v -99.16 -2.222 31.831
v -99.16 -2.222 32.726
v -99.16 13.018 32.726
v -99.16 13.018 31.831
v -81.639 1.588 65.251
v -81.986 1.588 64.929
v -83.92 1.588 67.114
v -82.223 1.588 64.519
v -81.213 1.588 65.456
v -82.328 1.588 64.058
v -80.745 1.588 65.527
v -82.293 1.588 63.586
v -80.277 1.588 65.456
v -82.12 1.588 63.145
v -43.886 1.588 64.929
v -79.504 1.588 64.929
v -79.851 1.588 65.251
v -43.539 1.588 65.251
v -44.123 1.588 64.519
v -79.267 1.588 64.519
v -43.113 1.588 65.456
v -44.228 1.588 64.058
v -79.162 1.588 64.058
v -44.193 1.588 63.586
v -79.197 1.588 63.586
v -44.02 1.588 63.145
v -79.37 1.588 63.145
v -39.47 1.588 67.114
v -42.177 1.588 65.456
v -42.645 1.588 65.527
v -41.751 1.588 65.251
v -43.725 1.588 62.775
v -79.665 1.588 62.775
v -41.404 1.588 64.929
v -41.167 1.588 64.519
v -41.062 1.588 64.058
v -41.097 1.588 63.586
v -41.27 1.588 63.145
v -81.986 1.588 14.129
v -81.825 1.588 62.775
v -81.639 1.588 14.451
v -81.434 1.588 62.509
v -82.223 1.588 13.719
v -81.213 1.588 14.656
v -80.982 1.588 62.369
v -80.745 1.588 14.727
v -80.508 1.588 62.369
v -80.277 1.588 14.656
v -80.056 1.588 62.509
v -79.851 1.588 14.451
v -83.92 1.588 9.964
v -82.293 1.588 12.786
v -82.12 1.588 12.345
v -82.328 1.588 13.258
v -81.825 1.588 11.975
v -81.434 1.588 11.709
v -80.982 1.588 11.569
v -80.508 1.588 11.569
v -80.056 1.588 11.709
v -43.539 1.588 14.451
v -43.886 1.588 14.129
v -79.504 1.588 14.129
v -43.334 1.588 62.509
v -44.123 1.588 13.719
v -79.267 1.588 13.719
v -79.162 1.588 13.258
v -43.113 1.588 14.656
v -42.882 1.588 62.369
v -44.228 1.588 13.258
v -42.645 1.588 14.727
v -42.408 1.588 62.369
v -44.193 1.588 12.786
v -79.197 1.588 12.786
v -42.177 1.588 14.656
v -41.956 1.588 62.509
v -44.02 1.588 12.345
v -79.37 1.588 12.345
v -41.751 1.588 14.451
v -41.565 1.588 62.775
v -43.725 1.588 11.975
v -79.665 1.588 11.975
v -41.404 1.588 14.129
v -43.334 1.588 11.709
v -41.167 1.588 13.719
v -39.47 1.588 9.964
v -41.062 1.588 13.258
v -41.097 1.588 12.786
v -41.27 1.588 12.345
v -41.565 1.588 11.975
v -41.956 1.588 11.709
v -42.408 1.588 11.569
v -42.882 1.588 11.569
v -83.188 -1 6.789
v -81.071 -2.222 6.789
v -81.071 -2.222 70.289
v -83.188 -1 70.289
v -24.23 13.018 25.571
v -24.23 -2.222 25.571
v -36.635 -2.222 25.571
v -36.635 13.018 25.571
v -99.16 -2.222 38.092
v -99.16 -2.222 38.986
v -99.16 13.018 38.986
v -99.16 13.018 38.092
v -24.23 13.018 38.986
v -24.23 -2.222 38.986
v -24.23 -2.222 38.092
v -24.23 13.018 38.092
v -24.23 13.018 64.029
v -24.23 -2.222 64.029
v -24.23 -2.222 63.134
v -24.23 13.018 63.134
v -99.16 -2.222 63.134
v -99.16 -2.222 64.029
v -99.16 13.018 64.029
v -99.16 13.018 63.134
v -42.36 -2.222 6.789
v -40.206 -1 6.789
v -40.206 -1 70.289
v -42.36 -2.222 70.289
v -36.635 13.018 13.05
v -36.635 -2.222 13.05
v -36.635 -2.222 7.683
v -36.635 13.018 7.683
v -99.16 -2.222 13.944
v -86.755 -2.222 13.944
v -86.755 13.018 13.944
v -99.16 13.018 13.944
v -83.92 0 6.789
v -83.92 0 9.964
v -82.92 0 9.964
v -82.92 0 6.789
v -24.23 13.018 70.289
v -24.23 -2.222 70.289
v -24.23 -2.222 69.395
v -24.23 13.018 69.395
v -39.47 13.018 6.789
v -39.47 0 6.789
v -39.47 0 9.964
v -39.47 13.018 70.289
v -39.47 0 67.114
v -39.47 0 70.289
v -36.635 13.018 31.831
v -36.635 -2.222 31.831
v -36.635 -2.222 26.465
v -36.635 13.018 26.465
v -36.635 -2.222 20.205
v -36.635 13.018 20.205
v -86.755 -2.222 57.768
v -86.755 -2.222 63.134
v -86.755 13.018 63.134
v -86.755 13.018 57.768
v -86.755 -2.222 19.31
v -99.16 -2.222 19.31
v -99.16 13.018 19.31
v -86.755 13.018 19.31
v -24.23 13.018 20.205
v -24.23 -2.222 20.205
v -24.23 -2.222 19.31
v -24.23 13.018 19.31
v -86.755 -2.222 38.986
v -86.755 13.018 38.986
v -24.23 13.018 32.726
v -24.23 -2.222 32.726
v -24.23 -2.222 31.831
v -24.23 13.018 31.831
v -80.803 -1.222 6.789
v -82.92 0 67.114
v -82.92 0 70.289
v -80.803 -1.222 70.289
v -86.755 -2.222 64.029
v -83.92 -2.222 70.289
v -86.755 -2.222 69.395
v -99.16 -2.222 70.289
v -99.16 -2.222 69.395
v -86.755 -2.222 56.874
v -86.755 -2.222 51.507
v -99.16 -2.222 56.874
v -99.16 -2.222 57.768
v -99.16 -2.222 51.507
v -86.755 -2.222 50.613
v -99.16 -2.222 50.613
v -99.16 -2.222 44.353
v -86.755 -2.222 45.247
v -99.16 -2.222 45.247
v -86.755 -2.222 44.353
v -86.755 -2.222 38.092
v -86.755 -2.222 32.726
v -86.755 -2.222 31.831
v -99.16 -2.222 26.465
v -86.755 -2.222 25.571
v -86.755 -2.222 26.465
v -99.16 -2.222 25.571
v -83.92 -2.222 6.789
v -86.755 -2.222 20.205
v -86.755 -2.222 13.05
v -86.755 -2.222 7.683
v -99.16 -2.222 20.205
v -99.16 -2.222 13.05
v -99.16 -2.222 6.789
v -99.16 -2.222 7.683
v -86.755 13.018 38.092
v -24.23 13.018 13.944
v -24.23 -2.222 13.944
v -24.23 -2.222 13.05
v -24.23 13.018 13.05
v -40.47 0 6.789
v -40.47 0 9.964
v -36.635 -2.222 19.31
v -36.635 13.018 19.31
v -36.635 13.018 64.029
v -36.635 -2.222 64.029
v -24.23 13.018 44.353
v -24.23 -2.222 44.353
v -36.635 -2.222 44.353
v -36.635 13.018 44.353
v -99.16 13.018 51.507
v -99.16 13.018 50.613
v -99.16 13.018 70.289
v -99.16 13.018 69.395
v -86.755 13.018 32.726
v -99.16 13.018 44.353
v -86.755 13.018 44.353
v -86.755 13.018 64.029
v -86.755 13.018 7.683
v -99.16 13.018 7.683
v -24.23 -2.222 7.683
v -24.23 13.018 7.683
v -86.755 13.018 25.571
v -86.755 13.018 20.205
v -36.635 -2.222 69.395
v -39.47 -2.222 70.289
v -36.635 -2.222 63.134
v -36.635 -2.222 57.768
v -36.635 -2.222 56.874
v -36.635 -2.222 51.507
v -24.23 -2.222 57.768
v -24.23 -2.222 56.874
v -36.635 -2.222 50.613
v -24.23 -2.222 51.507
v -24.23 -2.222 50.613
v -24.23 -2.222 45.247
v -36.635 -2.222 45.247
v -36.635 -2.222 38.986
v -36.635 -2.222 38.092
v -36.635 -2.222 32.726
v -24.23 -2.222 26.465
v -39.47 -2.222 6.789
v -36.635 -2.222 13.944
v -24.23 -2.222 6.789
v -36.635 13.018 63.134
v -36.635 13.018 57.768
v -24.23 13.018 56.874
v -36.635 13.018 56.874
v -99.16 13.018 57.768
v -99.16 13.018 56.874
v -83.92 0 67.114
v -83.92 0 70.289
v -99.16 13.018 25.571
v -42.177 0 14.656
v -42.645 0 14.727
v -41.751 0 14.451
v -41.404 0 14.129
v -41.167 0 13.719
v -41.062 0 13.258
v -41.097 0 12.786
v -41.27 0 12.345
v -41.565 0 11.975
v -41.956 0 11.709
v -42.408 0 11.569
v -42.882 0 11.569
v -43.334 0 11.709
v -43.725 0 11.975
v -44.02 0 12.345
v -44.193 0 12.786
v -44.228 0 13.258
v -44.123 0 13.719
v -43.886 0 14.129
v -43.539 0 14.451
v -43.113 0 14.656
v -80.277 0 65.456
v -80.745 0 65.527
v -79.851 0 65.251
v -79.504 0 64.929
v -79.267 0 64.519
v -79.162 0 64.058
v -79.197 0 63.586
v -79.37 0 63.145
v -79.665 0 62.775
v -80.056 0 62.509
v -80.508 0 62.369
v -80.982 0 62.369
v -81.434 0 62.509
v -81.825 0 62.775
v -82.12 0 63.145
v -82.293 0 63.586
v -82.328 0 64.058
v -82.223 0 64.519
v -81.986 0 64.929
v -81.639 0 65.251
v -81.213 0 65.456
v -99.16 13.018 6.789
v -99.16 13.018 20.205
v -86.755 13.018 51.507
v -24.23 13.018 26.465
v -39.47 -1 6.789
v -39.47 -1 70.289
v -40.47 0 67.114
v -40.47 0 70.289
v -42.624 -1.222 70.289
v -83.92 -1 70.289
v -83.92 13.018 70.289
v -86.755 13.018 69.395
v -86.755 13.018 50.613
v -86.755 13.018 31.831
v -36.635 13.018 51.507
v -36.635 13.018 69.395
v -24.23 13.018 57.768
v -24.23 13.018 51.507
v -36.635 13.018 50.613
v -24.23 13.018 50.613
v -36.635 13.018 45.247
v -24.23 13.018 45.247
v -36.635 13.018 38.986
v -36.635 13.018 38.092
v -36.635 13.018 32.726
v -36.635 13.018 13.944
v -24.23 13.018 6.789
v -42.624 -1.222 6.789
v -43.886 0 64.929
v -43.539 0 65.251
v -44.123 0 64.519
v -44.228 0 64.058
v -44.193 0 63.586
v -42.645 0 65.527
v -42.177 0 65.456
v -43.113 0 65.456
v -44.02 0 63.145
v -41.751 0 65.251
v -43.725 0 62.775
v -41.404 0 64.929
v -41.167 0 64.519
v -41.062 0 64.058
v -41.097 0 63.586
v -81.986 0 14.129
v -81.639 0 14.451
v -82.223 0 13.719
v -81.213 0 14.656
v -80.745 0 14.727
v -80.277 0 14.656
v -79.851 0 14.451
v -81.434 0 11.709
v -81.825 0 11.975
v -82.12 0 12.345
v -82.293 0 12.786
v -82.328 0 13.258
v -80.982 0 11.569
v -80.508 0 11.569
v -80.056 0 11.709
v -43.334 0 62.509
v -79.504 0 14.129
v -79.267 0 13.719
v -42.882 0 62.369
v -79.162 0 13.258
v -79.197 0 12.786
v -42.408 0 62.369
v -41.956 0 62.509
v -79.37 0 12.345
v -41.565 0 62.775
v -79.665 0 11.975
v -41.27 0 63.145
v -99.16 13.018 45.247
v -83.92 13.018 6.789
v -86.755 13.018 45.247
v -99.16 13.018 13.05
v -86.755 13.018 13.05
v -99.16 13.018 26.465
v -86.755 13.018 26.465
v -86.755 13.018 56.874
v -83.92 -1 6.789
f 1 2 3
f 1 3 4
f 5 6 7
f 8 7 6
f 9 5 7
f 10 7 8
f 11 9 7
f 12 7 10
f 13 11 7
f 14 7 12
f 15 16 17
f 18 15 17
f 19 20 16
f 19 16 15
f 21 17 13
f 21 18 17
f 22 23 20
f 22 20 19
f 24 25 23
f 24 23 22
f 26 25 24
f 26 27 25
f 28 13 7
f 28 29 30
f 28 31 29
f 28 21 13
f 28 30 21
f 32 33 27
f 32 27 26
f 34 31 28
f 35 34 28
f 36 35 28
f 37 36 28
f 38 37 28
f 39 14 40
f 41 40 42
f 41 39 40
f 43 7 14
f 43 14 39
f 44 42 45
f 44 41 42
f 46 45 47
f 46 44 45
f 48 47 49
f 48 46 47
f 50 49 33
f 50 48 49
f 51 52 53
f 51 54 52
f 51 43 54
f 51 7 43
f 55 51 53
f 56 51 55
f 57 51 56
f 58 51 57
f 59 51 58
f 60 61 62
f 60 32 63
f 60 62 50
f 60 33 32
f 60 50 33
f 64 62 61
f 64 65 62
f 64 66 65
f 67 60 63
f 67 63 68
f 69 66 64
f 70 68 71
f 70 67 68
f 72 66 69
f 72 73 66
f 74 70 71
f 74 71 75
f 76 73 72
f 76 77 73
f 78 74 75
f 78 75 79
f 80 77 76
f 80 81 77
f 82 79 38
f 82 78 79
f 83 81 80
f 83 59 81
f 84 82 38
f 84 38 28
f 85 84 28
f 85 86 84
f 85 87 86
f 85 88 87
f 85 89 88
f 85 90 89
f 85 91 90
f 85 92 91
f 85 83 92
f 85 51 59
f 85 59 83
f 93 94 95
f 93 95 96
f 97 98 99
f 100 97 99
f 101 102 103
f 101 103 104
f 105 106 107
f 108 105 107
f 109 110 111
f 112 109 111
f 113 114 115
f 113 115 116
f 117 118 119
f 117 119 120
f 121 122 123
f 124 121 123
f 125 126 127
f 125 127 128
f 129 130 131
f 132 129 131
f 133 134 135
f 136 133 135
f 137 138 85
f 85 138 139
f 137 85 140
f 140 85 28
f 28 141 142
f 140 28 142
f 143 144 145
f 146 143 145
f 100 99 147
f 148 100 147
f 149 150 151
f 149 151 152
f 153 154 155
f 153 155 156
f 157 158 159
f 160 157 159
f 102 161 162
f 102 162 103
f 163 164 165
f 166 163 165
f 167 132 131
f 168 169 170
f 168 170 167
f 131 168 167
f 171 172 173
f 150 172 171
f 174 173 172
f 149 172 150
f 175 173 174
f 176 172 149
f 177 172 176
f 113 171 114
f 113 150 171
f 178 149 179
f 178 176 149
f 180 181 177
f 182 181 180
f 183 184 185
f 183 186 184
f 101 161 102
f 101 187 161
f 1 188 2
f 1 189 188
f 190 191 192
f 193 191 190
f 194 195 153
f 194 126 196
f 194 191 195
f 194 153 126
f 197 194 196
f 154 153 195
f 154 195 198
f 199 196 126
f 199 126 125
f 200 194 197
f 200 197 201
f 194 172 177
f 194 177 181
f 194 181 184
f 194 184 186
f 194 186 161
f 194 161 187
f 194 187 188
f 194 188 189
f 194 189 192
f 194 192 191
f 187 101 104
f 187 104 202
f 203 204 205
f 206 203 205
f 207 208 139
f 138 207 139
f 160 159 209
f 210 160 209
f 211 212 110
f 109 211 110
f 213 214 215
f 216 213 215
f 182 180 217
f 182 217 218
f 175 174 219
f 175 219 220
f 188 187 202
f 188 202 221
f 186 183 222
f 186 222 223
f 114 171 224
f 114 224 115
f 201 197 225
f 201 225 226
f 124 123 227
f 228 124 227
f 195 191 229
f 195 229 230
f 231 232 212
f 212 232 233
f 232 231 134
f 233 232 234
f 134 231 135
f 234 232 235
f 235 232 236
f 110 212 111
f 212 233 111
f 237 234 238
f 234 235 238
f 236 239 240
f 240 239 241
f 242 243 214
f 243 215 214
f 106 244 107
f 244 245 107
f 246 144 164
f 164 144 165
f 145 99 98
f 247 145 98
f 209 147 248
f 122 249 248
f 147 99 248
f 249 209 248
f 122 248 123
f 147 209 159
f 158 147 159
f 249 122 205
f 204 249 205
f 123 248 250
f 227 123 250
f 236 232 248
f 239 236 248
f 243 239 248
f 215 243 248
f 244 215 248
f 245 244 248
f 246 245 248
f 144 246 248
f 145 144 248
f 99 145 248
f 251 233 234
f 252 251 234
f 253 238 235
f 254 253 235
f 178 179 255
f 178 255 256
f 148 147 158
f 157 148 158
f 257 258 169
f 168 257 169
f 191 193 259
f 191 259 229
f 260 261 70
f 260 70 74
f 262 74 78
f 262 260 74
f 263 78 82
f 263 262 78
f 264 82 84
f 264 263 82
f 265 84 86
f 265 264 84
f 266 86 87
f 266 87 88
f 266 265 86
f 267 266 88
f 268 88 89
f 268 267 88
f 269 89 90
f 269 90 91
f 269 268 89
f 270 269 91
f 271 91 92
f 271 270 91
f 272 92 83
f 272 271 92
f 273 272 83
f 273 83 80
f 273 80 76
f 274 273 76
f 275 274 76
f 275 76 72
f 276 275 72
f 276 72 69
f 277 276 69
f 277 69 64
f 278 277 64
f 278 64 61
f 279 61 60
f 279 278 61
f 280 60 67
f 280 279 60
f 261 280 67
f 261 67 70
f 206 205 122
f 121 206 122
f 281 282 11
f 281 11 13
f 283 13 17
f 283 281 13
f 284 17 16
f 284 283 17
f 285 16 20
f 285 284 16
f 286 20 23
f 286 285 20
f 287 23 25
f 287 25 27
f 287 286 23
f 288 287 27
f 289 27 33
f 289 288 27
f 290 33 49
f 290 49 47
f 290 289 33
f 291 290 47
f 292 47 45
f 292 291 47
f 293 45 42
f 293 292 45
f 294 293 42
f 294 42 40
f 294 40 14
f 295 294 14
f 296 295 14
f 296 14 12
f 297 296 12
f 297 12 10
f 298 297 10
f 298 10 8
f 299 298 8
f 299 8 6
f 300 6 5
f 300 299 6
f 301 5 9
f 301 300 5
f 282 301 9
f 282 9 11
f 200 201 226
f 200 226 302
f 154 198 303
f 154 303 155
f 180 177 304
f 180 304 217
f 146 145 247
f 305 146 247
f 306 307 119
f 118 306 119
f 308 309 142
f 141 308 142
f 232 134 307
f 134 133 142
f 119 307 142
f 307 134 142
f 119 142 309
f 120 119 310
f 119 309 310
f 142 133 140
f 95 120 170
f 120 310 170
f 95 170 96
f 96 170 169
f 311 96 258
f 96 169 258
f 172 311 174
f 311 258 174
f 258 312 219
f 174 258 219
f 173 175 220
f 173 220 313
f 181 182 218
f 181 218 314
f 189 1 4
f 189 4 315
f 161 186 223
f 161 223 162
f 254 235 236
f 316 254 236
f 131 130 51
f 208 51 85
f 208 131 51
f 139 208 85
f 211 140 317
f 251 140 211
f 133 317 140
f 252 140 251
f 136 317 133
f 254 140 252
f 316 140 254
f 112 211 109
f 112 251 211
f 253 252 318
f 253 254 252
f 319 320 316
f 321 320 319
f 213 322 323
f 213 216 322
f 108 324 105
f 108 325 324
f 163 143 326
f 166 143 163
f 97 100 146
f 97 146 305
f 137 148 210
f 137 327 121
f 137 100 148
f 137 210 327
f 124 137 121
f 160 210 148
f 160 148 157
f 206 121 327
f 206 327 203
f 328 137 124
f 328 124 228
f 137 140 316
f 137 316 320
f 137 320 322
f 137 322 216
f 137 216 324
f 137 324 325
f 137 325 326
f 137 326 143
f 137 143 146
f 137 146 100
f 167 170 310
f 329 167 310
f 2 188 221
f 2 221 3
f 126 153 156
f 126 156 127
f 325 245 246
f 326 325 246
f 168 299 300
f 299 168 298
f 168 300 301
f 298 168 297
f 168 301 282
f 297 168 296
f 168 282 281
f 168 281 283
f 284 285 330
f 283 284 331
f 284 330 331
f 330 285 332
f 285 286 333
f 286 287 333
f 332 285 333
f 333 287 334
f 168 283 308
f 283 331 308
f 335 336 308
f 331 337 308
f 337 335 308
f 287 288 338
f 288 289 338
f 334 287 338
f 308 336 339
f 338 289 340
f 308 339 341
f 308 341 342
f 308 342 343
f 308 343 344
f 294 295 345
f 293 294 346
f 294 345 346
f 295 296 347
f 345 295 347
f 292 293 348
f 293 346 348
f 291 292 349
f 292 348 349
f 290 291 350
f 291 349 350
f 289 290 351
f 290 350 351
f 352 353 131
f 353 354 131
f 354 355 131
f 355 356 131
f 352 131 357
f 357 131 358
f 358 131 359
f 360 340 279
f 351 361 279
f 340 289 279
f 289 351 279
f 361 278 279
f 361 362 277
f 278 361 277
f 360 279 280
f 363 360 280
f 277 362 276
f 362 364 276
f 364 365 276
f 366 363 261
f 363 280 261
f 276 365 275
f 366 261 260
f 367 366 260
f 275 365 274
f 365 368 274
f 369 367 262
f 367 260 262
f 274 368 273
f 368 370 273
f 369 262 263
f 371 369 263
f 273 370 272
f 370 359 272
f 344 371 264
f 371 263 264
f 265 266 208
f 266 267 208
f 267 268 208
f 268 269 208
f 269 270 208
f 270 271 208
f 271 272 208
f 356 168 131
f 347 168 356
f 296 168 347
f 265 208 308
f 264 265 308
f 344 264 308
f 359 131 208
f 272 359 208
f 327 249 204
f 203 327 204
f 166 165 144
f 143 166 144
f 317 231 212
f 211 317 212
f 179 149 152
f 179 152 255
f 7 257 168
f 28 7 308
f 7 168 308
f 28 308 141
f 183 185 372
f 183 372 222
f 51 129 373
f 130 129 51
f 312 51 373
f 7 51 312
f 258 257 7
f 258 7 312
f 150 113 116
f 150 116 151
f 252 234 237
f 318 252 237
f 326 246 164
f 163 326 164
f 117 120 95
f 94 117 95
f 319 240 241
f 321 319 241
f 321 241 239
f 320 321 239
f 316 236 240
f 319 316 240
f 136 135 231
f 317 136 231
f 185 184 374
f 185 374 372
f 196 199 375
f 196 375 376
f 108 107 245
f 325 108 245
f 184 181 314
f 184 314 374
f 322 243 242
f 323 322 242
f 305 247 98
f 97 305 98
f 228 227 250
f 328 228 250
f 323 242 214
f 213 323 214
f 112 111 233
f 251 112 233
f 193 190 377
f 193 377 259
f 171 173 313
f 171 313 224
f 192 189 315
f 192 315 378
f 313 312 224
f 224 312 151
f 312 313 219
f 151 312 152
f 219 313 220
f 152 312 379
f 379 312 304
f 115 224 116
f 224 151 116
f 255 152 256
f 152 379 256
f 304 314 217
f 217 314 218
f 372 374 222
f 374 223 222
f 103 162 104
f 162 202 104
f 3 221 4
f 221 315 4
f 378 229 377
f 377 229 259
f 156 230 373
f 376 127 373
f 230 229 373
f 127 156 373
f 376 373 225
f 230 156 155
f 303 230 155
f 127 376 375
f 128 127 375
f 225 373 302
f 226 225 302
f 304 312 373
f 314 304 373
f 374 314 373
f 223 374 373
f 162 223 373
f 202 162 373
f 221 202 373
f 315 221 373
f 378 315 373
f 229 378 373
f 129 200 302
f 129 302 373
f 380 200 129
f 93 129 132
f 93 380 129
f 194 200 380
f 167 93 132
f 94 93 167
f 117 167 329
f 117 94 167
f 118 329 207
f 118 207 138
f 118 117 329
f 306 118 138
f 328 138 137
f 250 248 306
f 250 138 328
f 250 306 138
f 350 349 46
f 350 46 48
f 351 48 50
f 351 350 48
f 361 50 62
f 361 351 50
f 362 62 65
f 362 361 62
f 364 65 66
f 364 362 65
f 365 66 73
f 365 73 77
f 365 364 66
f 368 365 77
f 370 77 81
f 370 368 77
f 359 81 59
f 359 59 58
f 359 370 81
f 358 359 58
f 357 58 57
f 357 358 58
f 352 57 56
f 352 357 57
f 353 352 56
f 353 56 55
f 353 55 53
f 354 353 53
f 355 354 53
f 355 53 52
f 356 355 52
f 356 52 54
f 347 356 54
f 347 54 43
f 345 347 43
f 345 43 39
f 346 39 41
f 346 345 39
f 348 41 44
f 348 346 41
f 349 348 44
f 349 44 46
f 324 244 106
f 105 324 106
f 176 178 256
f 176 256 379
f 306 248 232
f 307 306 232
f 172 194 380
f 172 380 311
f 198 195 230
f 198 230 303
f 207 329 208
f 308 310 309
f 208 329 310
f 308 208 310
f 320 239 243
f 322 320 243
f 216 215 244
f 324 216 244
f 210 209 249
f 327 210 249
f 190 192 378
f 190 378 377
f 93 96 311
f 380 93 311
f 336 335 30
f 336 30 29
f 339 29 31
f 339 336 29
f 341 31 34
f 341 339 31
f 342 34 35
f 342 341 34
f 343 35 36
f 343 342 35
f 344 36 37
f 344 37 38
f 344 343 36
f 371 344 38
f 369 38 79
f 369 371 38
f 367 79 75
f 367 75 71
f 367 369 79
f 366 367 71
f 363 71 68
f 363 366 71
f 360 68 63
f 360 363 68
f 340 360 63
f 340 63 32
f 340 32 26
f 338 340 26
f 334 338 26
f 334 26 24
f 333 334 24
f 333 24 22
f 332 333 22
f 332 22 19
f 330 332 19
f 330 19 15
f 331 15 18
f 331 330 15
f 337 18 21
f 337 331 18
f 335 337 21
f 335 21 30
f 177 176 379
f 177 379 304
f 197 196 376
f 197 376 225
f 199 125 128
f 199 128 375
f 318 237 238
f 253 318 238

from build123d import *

# Parameters (mm, degrees)
SKETCH1_W                = 44.45
SKETCH1_H                = 57.15
SKETCH1_R                = 1.5875
BOSS_EXTRUDE1_DEPTH      = 1.5875
BOSS_EXTRUDE2_DEPTH      = 11.43
BOSS_EXTRUDE2_DEPTH_BACK = 3.81
BOSS_EXTRUDE3_REACH      = 120.467


with BuildPart() as part:
    # Sketch1 → Boss-Extrude1 (new body)
    with BuildSketch(Plane(origin=(0, 0, 0), x_dir=(1, 0, 0), z_dir=(0, 1, 0))):
        with Locations((-61.695053498, -38.539128831)):
            Rectangle(SKETCH1_W, SKETCH1_H)
        with Locations(Location((-80.745053498, -63.939128831, 0), (0, 0, 270))):
            Circle(SKETCH1_R, mode=Mode.SUBTRACT)
        with Locations(Location((-42.645053498, -63.939128831, 0), (0, 0, 270))):
            Circle(SKETCH1_R, mode=Mode.SUBTRACT)
        with Locations(Location((-42.645053498, -13.139128831, 0), (0, 0, 270))):
            Circle(SKETCH1_R, mode=Mode.SUBTRACT)
        with Locations(Location((-80.745053498, -13.139128831, 0), (0, 0, 270))):
            Circle(SKETCH1_R, mode=Mode.SUBTRACT)
    extrude(amount=BOSS_EXTRUDE1_DEPTH)

    # Sketch2 → Boss-Extrude2 (add, two sides: drawn at the far end of the back side and taken through both)
    with BuildSketch(Plane(origin=(0, 1.5875, 0), x_dir=(1, 0, 0), z_dir=(0, 1, 0)).offset(-BOSS_EXTRUDE2_DEPTH_BACK)):
        Polygon((-99.160053498, -6.789128831), (-83.920053498, -6.789128831), (-83.920053498, -70.289128831), (-99.160053498, -70.289128831), (-99.160053498, -69.394762634), (-86.755200336, -69.394762634), (-86.755200336, -64.028565451), (-99.160053498, -64.028565451), (-99.160053498, -63.134199254), (-86.755200336, -63.134199254), (-86.755200336, -57.768002071), (-99.160053498, -57.768002071), (-99.160053498, -56.873635873), (-86.755200336, -56.873635873), (-86.755200336, -51.50743869), (-99.160053498, -51.50743869), (-99.160053498, -50.613072493), (-86.755200336, -50.613072493), (-86.755200336, -45.24687531), (-99.160053498, -45.24687531), (-99.160053498, -44.352509113), (-86.755200336, -44.352509113), (-86.755200336, -38.98631193), (-99.160053498, -38.98631193), (-99.160053498, -38.091945732), (-86.755200336, -38.091945732), (-86.755200336, -32.725748549), (-99.160053498, -32.725748549), (-99.160053498, -31.831382352), (-86.755200336, -31.831382352), (-86.755200336, -26.465185169), (-99.160053498, -26.465185169), (-99.160053498, -25.570818972), (-86.755200336, -25.570818972), (-86.755200336, -20.204621789), (-99.160053498, -20.204621789), (-99.160053498, -19.310255592), (-86.755200336, -19.310255592), (-86.755200336, -13.944058409), (-99.160053498, -13.944058409), (-99.160053498, -13.049692211), (-86.755200336, -13.049692211), (-86.755200336, -7.683495028), (-99.160053498, -7.683495028), align=None)
        Polygon((-24.230053498, -7.683495028), (-24.230053498, -6.789128831), (-39.470053498, -6.789128831), (-39.470053498, -70.289128831), (-24.230053498, -70.289128831), (-24.230053498, -69.394762634), (-36.63490666, -69.394762634), (-36.63490666, -64.028565451), (-24.230053498, -64.028565451), (-24.230053498, -63.134199254), (-36.63490666, -63.134199254), (-36.63490666, -57.768002071), (-24.230053498, -57.768002071), (-24.230053498, -56.873635873), (-36.63490666, -56.873635873), (-36.63490666, -51.50743869), (-24.230053498, -51.50743869), (-24.230053498, -50.613072493), (-36.63490666, -50.613072493), (-36.63490666, -45.24687531), (-24.230053498, -45.24687531), (-24.230053498, -44.352509113), (-36.63490666, -44.352509113), (-36.63490666, -38.98631193), (-24.230053498, -38.98631193), (-24.230053498, -38.091945732), (-36.63490666, -38.091945732), (-36.63490666, -32.725748549), (-24.230053498, -32.725748549), (-24.230053498, -31.831382352), (-36.63490666, -31.831382352), (-36.63490666, -26.465185169), (-24.230053498, -26.465185169), (-24.230053498, -25.570818972), (-36.63490666, -25.570818972), (-36.63490666, -20.204621789), (-24.230053498, -20.204621789), (-24.230053498, -19.310255592), (-36.63490666, -19.310255592), (-36.63490666, -13.944058409), (-24.230053498, -13.944058409), (-24.230053498, -13.049692211), (-36.63490666, -13.049692211), (-36.63490666, -7.683495028), align=None)
    extrude(amount=BOSS_EXTRUDE2_DEPTH + BOSS_EXTRUDE2_DEPTH_BACK)

    # Boss-Extrude3: up to this face of the body (flat: up to its plane)
    boss_extrude3_end = Plane(part.part.faces().sort_by_distance((-91.540053498, 5.3975, 6.789128831))[0])
    # Sketch4 → Boss-Extrude3 (add, up to the picked face)
    with BuildSketch(Plane.XY.offset(70.289128831), mode=Mode.PRIVATE) as boss_extrude3_sk1:
        Polygon((-83.920053498, 0), (-82.920053498, 0), (-80.802621386, -1.2225), (-42.623870056, -1.2225), (-40.470053498, 0), (-39.470053498, 0), (-39.470053498, -1), (-40.206037044, -1), (-42.359853602, -2.2225), (-81.070570578, -2.2225), (-83.188002691, -1), (-83.920053498, -1), align=None)
    boss_extrude3_tool1 = split(extrude(boss_extrude3_sk1.sketch, amount=-BOSS_EXTRUDE3_REACH, mode=Mode.PRIVATE), bisect_by=boss_extrude3_end, keep=Keep.BOTH, mode=Mode.PRIVATE)
    add(boss_extrude3_tool1.solids().sort_by(Axis((-61.697362, -1.608795, 70.289129), (0, 0, -1)))[0])


solid = part.part
